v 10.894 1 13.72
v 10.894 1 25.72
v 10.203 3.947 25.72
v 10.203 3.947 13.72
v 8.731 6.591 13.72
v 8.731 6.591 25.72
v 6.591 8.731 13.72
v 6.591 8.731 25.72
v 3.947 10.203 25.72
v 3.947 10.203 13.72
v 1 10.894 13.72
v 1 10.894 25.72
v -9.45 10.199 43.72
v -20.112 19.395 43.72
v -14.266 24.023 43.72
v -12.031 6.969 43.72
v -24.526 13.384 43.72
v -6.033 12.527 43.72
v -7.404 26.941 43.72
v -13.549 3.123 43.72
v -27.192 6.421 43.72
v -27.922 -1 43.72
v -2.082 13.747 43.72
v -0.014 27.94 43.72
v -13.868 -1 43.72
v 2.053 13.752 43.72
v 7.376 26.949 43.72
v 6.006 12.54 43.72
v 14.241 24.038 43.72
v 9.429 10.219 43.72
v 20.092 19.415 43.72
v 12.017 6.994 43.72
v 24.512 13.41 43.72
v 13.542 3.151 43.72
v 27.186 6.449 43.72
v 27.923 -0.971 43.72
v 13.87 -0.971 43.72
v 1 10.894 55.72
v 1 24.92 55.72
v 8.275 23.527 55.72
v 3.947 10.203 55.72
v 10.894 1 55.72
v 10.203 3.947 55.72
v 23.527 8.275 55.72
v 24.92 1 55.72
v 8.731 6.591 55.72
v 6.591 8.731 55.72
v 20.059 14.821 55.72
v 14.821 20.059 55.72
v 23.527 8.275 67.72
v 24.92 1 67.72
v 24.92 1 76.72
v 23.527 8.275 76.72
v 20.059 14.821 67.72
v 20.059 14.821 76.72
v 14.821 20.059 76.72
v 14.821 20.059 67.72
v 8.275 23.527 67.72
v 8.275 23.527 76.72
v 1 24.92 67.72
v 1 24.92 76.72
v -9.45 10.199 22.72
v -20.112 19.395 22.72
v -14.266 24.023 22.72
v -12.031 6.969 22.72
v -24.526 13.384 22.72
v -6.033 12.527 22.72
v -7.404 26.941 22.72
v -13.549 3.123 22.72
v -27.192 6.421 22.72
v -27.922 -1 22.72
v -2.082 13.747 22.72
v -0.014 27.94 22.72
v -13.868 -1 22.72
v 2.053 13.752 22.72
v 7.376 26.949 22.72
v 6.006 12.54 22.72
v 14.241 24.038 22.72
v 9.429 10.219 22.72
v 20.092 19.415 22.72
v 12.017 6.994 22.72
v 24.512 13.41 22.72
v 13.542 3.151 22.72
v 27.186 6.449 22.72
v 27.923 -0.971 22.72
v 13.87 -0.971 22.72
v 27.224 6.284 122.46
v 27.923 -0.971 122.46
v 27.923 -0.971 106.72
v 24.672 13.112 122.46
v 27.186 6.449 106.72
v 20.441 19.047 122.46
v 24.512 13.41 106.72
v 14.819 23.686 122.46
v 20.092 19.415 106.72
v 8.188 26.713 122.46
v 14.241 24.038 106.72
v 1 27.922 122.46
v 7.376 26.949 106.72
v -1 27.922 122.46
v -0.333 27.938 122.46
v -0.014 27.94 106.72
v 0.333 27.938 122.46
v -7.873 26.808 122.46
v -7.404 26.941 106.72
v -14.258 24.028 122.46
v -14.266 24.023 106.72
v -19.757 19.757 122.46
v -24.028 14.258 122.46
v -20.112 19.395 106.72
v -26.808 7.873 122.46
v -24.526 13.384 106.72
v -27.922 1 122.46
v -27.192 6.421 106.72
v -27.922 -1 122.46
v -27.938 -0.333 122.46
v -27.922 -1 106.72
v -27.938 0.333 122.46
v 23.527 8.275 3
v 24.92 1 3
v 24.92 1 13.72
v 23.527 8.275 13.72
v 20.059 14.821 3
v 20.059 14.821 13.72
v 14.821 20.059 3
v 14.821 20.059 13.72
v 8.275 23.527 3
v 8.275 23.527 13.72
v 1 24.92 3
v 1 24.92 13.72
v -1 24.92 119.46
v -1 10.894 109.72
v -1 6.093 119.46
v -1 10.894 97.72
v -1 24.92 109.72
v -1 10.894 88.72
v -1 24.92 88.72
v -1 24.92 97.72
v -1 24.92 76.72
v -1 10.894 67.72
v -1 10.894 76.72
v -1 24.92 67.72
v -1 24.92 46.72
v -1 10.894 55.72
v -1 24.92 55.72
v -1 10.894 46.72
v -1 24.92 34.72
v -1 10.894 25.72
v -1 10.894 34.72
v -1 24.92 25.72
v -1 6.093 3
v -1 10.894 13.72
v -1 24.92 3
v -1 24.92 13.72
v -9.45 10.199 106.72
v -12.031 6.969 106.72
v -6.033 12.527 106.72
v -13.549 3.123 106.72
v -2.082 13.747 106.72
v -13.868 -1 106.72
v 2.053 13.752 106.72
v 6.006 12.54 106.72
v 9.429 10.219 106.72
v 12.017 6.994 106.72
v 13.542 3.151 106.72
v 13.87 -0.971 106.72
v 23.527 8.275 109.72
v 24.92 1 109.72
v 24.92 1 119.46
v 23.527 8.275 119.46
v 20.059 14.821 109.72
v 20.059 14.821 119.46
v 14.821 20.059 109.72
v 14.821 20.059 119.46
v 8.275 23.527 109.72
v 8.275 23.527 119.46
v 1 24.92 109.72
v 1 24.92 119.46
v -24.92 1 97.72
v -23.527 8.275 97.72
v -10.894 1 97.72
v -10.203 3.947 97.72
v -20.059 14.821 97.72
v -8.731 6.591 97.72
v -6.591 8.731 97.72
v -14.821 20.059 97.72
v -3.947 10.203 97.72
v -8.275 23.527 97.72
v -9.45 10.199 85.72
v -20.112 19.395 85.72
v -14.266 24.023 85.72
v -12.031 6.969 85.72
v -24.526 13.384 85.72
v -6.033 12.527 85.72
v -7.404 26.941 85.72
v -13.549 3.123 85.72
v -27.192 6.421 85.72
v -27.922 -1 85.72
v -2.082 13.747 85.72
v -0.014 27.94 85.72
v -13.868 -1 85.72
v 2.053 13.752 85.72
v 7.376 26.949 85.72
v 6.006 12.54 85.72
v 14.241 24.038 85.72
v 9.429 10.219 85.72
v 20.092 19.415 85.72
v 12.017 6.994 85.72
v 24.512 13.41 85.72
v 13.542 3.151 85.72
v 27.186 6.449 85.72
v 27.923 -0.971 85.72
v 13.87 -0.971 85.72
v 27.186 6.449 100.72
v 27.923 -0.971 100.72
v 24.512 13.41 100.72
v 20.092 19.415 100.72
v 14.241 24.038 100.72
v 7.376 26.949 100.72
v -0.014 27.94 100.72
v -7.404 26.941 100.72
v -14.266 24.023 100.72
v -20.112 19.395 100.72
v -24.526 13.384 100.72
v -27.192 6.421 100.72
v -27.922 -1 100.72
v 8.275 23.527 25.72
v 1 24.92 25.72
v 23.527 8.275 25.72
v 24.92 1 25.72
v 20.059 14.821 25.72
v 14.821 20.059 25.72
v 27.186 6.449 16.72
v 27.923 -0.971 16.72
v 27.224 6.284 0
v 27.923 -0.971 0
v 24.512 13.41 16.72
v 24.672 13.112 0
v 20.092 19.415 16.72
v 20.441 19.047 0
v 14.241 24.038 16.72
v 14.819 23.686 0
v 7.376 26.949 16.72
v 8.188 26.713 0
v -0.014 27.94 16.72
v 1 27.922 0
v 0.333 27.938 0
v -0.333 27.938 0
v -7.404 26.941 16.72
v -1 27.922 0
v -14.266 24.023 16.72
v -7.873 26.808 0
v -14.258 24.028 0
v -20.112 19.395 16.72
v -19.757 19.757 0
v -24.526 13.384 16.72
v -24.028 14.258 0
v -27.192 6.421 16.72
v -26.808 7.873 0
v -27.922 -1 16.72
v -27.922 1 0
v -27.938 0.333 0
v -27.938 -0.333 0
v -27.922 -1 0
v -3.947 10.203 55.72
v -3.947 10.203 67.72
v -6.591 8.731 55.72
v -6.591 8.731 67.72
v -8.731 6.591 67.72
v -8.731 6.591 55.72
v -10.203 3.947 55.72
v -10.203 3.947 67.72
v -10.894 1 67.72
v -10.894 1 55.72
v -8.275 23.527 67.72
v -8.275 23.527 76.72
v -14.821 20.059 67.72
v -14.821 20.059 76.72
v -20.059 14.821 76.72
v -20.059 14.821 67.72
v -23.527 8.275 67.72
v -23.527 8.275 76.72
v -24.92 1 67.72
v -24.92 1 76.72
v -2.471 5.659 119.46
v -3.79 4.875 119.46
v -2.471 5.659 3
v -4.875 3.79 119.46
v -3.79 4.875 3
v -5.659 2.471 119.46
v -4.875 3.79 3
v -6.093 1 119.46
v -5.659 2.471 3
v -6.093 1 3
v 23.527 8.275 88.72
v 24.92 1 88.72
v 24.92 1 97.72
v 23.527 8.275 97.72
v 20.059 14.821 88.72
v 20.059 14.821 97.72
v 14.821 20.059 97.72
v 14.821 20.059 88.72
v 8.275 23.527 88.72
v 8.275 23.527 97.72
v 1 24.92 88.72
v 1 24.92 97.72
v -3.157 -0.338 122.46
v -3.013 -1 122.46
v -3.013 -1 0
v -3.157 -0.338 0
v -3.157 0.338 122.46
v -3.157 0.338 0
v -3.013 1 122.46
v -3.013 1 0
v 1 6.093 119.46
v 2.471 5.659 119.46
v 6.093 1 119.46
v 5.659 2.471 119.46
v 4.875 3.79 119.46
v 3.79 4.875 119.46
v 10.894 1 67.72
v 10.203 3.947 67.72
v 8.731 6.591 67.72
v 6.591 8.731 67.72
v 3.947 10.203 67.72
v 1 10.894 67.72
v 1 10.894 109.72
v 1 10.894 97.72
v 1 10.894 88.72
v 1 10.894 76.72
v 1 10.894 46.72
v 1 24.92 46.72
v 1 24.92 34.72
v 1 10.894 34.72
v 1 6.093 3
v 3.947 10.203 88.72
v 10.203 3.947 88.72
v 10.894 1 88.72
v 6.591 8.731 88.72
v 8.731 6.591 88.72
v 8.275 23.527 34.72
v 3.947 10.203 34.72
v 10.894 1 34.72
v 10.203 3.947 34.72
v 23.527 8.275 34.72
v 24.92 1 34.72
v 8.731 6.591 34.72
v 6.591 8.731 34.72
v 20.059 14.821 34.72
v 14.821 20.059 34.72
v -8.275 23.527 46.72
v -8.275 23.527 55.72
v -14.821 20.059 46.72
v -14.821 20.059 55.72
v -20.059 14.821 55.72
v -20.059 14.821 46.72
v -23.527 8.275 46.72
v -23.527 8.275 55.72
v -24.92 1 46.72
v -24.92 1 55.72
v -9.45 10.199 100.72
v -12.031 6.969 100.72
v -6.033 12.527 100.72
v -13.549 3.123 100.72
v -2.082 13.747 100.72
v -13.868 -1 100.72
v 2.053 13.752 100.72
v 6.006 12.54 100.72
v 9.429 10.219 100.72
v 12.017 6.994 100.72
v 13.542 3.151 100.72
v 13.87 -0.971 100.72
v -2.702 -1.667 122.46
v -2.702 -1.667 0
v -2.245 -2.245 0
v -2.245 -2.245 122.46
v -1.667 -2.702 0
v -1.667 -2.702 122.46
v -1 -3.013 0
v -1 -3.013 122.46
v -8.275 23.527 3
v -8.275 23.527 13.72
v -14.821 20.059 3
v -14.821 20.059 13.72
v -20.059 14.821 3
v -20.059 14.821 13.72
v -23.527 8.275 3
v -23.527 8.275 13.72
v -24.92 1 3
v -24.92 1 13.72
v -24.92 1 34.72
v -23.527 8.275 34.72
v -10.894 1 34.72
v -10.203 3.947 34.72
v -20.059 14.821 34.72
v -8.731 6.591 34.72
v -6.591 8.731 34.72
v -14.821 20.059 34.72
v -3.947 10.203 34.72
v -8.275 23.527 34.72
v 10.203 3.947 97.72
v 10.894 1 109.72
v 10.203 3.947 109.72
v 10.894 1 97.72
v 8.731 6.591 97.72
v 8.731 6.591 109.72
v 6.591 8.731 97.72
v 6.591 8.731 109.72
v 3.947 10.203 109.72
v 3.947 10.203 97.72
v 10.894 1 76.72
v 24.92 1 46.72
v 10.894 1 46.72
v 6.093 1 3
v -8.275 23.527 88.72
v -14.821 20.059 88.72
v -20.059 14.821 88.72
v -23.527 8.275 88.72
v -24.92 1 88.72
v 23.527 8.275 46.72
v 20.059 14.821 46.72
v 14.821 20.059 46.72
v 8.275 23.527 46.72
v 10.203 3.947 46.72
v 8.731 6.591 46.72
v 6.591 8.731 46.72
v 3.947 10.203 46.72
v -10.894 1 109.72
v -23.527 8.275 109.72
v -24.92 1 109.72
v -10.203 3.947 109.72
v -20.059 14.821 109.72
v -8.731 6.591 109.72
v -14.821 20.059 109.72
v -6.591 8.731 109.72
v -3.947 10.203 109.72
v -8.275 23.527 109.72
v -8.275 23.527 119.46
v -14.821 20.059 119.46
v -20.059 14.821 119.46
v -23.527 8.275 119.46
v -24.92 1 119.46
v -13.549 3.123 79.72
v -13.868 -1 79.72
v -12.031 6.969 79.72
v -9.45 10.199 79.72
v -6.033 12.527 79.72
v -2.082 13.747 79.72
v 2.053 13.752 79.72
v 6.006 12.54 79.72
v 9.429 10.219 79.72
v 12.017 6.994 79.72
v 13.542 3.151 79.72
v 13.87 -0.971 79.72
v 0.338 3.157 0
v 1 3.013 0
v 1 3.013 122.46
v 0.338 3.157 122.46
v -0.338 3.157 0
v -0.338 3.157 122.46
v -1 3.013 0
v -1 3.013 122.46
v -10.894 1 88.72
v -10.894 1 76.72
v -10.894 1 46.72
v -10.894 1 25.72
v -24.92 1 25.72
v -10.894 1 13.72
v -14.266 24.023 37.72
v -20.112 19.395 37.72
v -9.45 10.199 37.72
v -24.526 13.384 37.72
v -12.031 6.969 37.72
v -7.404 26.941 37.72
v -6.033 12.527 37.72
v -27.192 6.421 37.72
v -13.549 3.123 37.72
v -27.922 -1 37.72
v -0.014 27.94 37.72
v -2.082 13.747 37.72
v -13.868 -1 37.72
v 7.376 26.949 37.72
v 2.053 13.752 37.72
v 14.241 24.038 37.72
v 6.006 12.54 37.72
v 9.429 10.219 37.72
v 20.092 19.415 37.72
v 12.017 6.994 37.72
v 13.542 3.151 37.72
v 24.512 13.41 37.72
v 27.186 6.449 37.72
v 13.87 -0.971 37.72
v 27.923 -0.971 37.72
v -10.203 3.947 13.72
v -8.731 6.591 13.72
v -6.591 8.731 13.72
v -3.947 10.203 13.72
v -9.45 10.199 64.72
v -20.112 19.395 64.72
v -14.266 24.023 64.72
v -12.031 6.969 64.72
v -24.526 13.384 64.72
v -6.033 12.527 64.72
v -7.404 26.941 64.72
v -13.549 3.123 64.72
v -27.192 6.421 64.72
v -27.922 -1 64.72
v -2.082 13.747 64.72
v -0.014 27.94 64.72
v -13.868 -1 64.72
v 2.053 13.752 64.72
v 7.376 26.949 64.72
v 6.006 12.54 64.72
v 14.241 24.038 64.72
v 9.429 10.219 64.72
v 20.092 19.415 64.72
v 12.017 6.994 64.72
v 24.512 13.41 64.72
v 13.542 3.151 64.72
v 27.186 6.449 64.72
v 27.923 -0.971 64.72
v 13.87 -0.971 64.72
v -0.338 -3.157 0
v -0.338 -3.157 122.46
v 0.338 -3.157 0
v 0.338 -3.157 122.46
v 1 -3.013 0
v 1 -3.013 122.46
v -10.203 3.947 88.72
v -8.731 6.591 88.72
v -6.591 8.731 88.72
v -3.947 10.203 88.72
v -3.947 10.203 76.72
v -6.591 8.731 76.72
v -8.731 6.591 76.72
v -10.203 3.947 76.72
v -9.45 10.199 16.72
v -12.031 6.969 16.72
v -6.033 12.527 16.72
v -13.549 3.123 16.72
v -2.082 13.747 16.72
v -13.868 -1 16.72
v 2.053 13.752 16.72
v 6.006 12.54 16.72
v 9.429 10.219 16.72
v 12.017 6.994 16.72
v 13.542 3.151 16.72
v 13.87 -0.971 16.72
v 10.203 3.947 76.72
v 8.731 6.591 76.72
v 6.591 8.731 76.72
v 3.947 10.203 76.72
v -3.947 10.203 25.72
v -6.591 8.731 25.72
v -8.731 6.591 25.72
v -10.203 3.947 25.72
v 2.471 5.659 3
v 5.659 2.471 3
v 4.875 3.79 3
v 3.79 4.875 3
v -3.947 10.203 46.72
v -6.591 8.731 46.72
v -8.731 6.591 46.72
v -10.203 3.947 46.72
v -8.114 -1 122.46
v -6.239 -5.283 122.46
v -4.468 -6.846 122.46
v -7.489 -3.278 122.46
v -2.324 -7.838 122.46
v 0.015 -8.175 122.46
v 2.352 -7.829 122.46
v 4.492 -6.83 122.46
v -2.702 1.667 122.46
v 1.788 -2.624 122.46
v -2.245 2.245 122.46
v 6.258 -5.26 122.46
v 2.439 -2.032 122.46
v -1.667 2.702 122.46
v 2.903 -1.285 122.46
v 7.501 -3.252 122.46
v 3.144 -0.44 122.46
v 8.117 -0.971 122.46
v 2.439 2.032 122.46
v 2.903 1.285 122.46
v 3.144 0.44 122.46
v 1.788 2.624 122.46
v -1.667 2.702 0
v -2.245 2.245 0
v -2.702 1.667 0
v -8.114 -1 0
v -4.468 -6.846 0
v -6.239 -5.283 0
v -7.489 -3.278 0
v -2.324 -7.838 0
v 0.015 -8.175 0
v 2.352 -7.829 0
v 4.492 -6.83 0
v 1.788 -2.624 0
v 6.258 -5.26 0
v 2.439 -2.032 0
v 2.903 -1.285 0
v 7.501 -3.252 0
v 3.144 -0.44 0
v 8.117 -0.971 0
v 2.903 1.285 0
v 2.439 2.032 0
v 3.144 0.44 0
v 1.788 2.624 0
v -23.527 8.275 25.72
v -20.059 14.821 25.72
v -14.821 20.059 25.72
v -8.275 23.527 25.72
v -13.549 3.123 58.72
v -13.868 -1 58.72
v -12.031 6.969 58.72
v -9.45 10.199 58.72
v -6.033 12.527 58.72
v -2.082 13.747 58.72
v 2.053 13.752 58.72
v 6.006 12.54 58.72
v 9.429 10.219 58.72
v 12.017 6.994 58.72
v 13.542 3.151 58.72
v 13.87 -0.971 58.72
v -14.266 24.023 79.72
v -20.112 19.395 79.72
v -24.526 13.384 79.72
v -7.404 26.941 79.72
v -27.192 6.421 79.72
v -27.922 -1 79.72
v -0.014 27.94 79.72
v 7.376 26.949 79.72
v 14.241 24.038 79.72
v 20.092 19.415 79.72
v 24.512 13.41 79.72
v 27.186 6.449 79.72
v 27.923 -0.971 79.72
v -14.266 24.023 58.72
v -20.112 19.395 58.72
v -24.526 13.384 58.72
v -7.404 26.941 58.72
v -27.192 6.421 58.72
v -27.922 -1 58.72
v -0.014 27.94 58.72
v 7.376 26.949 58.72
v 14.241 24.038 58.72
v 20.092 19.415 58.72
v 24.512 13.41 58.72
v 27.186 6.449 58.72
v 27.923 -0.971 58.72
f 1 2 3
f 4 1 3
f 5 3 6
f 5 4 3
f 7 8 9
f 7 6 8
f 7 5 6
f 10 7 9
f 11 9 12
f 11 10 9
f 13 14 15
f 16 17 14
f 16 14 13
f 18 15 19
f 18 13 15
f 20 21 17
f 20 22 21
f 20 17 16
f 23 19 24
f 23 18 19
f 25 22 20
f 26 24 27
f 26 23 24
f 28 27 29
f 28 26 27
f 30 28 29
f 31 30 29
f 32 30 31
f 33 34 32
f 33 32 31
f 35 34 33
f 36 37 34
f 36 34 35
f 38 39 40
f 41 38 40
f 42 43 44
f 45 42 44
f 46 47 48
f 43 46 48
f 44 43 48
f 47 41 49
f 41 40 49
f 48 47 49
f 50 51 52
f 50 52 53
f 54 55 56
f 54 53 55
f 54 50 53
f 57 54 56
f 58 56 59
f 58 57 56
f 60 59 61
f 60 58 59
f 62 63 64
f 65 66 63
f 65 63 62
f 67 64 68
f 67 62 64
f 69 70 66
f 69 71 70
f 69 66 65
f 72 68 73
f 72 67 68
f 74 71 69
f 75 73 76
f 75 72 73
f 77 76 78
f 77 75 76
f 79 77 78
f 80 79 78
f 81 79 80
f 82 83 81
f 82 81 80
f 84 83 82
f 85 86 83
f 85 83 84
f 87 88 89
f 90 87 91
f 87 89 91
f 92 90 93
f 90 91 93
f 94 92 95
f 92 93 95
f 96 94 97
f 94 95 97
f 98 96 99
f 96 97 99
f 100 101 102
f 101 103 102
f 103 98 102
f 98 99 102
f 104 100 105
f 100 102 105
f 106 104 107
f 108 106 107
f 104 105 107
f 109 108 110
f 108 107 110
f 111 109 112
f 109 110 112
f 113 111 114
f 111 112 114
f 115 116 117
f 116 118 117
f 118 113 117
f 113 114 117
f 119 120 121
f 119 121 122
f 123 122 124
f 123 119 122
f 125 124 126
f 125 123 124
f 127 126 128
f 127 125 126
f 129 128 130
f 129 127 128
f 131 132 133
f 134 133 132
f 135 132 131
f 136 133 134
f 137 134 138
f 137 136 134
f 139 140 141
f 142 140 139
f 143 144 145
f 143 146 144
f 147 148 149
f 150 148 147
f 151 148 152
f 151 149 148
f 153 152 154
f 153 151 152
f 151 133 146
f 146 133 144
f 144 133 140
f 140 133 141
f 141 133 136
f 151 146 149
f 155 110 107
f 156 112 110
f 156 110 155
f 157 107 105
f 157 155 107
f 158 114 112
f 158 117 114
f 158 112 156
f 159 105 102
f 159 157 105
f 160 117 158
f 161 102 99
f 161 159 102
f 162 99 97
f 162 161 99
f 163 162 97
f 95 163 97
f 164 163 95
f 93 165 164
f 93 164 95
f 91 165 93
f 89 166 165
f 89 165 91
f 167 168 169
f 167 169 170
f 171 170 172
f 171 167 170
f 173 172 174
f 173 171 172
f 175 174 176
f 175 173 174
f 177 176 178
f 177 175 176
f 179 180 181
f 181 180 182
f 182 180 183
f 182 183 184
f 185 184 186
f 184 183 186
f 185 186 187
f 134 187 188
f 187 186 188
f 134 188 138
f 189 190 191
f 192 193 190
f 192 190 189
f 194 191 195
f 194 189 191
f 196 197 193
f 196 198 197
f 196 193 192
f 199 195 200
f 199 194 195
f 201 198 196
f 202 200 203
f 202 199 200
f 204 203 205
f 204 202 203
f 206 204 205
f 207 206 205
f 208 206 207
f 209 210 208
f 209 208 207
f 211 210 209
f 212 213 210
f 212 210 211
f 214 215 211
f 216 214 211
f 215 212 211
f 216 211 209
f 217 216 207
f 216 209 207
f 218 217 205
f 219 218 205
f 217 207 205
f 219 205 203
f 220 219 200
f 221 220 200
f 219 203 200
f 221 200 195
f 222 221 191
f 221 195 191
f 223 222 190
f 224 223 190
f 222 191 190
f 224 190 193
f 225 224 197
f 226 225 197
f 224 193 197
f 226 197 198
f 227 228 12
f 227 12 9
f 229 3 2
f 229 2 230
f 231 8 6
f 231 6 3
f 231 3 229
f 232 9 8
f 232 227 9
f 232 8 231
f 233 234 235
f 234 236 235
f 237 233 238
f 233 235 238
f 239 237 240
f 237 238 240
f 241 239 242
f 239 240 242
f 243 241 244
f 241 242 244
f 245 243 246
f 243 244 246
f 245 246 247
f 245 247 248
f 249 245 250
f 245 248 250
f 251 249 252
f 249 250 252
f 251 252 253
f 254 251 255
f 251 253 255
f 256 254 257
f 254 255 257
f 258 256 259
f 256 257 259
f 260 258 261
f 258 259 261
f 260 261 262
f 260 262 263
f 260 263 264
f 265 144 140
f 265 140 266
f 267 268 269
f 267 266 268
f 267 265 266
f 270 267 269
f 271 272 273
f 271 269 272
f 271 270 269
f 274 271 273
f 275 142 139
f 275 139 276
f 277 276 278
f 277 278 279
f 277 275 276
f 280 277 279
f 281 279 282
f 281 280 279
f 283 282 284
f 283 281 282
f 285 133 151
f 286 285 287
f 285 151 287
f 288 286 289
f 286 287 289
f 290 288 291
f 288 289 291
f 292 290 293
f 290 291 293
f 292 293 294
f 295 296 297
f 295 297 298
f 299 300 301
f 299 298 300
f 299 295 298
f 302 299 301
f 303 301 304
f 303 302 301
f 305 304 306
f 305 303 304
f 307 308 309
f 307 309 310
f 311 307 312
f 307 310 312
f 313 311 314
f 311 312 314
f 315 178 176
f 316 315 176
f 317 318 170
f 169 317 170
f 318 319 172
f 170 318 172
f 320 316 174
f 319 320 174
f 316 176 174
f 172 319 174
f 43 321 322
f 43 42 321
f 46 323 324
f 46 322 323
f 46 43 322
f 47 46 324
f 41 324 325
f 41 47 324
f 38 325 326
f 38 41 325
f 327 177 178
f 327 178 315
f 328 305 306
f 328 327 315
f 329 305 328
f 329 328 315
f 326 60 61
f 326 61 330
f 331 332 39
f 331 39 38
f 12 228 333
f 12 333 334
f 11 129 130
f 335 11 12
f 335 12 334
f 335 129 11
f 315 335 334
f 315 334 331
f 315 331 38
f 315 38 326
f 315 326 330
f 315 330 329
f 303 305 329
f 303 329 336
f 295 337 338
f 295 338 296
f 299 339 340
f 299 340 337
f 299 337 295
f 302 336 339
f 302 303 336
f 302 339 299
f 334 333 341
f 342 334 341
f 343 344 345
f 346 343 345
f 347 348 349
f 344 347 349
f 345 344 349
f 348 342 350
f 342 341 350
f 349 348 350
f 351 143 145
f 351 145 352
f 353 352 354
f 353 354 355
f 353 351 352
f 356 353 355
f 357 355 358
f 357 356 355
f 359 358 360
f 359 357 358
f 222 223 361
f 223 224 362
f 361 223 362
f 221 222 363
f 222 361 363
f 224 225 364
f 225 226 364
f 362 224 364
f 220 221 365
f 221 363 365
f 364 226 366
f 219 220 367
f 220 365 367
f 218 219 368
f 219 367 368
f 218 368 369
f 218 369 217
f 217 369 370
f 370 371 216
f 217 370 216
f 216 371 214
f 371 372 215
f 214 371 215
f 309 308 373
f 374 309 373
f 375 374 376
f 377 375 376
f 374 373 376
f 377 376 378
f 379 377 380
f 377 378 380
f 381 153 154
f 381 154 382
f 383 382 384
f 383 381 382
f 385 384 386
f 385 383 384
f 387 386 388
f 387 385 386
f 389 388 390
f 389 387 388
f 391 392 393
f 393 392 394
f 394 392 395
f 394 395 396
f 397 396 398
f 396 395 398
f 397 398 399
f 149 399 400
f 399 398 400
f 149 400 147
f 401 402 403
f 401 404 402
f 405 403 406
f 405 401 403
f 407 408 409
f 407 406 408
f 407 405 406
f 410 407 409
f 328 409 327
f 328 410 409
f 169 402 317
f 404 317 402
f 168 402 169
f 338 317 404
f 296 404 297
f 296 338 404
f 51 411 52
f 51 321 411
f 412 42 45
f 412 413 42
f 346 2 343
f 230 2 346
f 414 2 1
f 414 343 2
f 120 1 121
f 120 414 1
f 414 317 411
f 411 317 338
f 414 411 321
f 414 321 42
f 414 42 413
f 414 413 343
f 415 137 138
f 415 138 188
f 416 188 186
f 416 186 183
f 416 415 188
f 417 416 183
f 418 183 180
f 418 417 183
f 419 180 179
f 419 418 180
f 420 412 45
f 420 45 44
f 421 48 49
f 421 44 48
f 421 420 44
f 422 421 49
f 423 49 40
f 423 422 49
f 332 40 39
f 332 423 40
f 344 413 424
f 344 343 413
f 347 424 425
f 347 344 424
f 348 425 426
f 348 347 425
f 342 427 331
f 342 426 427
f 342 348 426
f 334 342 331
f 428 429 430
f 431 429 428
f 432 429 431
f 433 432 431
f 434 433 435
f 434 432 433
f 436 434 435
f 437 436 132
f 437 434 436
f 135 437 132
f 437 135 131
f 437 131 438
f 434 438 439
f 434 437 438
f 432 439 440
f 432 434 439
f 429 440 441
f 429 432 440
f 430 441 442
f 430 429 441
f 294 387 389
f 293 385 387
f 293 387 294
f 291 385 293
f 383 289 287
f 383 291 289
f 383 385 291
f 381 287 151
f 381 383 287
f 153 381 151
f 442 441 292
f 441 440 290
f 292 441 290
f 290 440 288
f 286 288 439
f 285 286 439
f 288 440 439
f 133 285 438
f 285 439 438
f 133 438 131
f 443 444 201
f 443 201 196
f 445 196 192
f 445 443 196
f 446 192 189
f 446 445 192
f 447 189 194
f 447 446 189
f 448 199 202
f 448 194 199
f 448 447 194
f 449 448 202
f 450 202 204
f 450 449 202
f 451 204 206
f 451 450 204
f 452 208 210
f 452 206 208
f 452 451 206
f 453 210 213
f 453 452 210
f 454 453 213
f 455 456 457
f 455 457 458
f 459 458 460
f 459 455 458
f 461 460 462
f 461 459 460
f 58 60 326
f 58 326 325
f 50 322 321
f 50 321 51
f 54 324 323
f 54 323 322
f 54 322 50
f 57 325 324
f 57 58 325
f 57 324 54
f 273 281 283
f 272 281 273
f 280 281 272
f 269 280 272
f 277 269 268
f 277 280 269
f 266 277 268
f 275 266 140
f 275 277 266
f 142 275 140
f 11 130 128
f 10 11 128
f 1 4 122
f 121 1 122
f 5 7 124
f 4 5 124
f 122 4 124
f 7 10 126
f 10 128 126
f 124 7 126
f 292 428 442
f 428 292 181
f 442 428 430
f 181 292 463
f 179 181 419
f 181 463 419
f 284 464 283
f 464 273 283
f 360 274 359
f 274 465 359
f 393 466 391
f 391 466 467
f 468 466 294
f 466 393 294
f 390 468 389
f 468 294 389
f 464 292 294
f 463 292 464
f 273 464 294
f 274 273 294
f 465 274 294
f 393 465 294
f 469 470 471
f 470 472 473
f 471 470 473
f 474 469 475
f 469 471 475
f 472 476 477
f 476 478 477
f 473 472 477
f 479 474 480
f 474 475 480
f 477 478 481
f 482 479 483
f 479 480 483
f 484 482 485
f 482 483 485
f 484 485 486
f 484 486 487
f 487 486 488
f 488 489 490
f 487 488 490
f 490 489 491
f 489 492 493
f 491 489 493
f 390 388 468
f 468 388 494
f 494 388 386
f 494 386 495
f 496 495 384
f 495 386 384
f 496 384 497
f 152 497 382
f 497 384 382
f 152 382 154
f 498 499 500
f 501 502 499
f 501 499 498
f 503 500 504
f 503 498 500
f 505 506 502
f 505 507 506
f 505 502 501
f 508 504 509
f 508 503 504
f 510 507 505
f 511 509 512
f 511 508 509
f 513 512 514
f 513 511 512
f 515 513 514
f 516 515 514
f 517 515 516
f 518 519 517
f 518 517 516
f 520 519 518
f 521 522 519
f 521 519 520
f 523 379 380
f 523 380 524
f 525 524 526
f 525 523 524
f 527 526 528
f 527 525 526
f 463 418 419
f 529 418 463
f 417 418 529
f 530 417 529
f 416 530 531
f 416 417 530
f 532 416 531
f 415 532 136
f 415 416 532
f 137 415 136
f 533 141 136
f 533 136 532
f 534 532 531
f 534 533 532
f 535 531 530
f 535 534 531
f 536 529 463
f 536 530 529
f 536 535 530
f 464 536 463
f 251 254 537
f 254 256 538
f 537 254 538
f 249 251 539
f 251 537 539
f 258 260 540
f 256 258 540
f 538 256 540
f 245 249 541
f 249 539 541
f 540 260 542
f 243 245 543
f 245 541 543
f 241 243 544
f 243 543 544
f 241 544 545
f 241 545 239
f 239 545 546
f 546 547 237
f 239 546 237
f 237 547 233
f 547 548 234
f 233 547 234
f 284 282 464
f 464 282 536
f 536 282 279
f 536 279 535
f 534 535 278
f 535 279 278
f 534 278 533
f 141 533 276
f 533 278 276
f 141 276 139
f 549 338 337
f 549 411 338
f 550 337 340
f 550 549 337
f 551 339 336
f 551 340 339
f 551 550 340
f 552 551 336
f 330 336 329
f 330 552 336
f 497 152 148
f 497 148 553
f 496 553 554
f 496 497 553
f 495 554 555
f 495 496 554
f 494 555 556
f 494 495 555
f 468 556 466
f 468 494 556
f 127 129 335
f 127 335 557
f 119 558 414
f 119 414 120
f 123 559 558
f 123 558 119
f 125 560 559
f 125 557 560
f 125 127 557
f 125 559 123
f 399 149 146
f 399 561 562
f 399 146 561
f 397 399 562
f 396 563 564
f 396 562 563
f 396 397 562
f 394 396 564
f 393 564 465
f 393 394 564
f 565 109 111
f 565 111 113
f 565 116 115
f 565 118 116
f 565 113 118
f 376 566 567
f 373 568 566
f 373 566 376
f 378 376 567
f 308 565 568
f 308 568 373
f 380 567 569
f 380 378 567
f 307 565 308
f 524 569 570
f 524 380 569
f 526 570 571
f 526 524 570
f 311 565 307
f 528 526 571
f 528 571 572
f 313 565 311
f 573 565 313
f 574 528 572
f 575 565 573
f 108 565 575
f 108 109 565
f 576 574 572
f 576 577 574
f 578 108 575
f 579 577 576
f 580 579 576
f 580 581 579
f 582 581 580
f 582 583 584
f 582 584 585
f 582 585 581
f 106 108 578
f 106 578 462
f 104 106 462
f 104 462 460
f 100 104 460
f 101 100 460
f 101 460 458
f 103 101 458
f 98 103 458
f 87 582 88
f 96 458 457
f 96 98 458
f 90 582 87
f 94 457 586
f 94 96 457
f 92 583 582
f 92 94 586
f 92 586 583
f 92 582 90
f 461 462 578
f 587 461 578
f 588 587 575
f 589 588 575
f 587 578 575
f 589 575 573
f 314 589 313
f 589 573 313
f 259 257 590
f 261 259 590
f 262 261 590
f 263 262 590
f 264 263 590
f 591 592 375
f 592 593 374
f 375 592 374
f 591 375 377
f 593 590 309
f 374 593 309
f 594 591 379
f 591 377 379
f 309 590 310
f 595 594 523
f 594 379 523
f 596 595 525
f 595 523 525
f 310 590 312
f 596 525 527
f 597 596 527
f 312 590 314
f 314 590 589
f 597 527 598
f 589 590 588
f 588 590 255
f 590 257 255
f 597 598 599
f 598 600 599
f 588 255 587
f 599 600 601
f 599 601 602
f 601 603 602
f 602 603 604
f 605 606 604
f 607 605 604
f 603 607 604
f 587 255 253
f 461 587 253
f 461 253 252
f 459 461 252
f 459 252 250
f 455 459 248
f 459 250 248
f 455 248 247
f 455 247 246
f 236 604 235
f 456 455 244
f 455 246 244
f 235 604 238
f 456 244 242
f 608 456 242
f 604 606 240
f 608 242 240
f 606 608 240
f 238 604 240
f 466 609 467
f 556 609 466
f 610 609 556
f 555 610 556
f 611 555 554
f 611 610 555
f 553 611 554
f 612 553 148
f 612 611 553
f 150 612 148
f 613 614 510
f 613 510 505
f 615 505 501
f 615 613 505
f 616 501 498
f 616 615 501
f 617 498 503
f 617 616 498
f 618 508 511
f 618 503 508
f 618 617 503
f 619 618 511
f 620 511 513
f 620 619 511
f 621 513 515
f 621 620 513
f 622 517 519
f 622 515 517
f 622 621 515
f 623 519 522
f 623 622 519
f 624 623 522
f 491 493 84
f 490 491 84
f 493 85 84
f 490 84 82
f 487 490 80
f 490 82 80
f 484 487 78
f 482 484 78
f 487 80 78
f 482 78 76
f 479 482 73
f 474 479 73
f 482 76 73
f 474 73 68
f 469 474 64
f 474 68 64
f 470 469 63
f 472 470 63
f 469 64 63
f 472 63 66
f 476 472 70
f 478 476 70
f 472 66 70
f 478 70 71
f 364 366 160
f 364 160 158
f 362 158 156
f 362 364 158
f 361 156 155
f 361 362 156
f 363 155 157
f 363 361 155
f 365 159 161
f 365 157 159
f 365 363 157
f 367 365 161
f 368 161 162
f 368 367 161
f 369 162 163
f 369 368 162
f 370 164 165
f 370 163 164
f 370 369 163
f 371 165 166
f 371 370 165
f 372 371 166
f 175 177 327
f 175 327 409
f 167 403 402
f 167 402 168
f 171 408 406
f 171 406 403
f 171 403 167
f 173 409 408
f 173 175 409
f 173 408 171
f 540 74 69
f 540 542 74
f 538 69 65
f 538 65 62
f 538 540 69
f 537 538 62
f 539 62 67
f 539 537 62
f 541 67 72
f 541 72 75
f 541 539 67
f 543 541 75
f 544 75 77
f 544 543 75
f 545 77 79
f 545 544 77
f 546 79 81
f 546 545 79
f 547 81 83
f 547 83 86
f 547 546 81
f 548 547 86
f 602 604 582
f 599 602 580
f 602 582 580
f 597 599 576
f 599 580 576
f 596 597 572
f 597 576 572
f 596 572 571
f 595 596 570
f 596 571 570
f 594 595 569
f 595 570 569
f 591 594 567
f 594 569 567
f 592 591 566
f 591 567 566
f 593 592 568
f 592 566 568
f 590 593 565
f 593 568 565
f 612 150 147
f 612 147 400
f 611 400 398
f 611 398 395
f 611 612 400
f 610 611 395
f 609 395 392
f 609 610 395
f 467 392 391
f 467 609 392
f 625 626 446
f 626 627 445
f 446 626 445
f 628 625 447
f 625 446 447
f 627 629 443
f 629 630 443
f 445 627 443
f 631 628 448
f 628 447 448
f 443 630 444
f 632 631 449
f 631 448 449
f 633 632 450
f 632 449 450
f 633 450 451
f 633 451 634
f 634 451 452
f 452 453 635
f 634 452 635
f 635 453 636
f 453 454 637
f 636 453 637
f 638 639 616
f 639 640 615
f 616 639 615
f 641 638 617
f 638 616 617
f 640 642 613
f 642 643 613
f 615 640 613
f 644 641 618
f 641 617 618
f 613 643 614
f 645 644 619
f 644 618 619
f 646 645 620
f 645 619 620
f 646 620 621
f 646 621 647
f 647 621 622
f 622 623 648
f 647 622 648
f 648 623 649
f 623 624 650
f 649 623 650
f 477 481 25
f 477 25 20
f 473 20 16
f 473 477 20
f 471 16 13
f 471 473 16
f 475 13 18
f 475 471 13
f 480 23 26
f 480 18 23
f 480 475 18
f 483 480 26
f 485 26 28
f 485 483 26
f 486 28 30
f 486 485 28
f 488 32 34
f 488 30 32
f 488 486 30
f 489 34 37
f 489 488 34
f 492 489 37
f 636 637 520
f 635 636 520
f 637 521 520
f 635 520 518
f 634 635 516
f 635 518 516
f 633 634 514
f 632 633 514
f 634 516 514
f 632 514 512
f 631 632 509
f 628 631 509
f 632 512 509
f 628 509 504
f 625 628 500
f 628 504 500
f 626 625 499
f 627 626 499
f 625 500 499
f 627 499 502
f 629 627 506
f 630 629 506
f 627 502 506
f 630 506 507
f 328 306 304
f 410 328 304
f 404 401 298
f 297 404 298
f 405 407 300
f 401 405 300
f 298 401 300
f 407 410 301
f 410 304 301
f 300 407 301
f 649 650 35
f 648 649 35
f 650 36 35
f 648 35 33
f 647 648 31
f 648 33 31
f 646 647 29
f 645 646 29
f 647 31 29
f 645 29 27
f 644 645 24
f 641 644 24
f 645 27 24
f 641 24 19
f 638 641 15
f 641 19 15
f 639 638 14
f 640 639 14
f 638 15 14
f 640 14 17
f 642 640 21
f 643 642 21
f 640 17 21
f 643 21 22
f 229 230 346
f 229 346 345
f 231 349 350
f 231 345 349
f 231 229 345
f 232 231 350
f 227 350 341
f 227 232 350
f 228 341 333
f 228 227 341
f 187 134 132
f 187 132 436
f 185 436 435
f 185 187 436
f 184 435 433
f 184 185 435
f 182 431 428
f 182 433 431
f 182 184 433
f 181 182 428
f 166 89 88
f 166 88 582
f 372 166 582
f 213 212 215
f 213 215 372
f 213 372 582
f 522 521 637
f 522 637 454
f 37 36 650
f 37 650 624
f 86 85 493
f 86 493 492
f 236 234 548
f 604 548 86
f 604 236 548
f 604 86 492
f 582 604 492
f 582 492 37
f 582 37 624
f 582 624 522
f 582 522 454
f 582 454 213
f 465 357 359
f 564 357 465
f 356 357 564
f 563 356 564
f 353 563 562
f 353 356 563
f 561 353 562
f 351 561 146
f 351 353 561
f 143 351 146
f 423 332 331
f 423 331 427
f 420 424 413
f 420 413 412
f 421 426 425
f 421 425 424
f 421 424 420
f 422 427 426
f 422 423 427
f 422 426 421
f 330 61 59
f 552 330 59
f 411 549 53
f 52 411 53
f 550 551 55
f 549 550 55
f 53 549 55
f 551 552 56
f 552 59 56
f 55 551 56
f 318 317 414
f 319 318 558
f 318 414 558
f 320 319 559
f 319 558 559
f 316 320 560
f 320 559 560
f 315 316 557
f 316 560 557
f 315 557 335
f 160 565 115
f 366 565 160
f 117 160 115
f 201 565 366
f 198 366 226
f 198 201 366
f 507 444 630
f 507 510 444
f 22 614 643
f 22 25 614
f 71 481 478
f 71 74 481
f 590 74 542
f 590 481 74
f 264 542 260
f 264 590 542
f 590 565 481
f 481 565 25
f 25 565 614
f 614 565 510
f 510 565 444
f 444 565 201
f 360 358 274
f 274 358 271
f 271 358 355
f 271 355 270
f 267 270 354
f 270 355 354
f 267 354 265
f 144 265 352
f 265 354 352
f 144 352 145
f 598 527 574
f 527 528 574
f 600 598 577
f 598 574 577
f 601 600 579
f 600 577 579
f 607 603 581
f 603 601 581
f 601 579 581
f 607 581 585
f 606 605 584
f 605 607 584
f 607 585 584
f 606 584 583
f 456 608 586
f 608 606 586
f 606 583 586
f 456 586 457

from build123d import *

# Parameters (mm, degrees)
SKETCH3_R            = 27.94
BOSS_EXTRUDE2_DEPTH  = 122.46
SKETCH5_R            = 3.175
CUT_EXTRUDE1_DEPTH   = 129.676877488
SKETCH4_W            = 14
SKETCH4_H            = 6
SHELL1_START         = 3
SHELL1_OUTLINE_R     = 10.94
SHELL1_OUTLINE_R_2   = 6.175
SHELL1_DEPTH         = 116.46
SHELL1_2_OUTLINE_R   = 24.94
SHELL1_2_OUTLINE_R_2 = 10.94
SHELL1_2_DEPTH       = 10.72
SHELL1_START_2       = 109.72
SHELL1_3_OUTLINE_R   = 24.94
SHELL1_3_OUTLINE_R_2 = 10.94
SHELL1_3_DEPTH       = 9.74
SHELL1_START_3       = 25.72
SHELL1_4_OUTLINE_R   = 24.94
SHELL1_4_OUTLINE_R_2 = 10.94
SHELL1_4_DEPTH       = 9
SHELL1_START_4       = 46.72
SHELL1_5_OUTLINE_R   = 24.94
SHELL1_5_OUTLINE_R_2 = 10.94
SHELL1_5_DEPTH       = 9
SHELL1_START_5       = 67.72
SHELL1_6_OUTLINE_R   = 24.94
SHELL1_6_OUTLINE_R_2 = 10.94
SHELL1_6_DEPTH       = 9
SHELL1_START_6       = 88.72
SHELL1_7_OUTLINE_R   = 24.94
SHELL1_7_OUTLINE_R_2 = 10.94
SHELL1_7_DEPTH       = 9
BOSS_EXTRUDE3_REACH  = 130.677
SKETCH13_W           = 16.483162312
SKETCH13_H           = 6
CUT_EXTRUDE3_DEPTH   = 123
BOSS_EXTRUDE5_START  = -122.46
BOSS_EXTRUDE5_DEPTH  = 122.46


# Read off the part's stored shape, not the designer's step: Shell1
with BuildPart() as part:
    # Sketch3 → Boss-Extrude2 (new body)
    with BuildSketch(Plane.XY):
        Circle(SKETCH3_R)
    extrude(amount=BOSS_EXTRUDE2_DEPTH)

    # Sketch5 → Cut-Extrude1 (cut, through all)
    with BuildSketch(Plane.XY.offset(122.46)):
        Circle(SKETCH5_R)
    extrude(amount=-CUT_EXTRUDE1_DEPTH, mode=Mode.SUBTRACT)

    # Sketch4 → Cut-Revolve1 (revolve, cut)
    with BuildSketch(Plane(origin=(0, 0, 0), x_dir=(1, 0, 0), z_dir=(0, 1, 0)), mode=Mode.PRIVATE) as cut_revolve1_sk:
        with Locations((-20.94, -103.72)):
            Rectangle(SKETCH4_W, SKETCH4_H)
        with Locations((-20.94, -82.72)):
            Rectangle(SKETCH4_W, SKETCH4_H)
        with Locations((-20.94, -61.72)):
            Rectangle(SKETCH4_W, SKETCH4_H)
        with Locations((-20.94, -40.72)):
            Rectangle(SKETCH4_W, SKETCH4_H)
        with Locations((-20.94, -19.72)):
            Rectangle(SKETCH4_W, SKETCH4_H)
    revolve(cut_revolve1_sk.sketch.rotate(Axis((0, 0, 122.46), (0, 0, -1)), 180), axis=Axis((0, 0, 122.46), (0, 0, -1)), mode=Mode.SUBTRACT)

    # Shell1 outline → Shell1 (cut)
    with BuildSketch(Plane.XY.offset(SHELL1_START)):
        Circle(SHELL1_OUTLINE_R)
        Circle(SHELL1_OUTLINE_R_2, mode=Mode.SUBTRACT)
    extrude(amount=SHELL1_DEPTH, mode=Mode.SUBTRACT)

    # Shell1 2 outline → Shell1 2 (cut)
    with BuildSketch(Plane.XY.offset(SHELL1_START)):
        Circle(SHELL1_2_OUTLINE_R)
        Circle(SHELL1_2_OUTLINE_R_2, mode=Mode.SUBTRACT)
    extrude(amount=SHELL1_2_DEPTH, mode=Mode.SUBTRACT)

    # Shell1 3 outline → Shell1 3 (cut)
    with BuildSketch(Plane.XY.offset(SHELL1_START_2)):
        Circle(SHELL1_3_OUTLINE_R)
        Circle(SHELL1_3_OUTLINE_R_2, mode=Mode.SUBTRACT)
    extrude(amount=SHELL1_3_DEPTH, mode=Mode.SUBTRACT)

    # Shell1 4 outline → Shell1 4 (cut)
    with BuildSketch(Plane.XY.offset(SHELL1_START_3)):
        Circle(SHELL1_4_OUTLINE_R)
        Circle(SHELL1_4_OUTLINE_R_2, mode=Mode.SUBTRACT)
    extrude(amount=SHELL1_4_DEPTH, mode=Mode.SUBTRACT)

    # Shell1 5 outline → Shell1 5 (cut)
    with BuildSketch(Plane.XY.offset(SHELL1_START_4)):
        Circle(SHELL1_5_OUTLINE_R)
        Circle(SHELL1_5_OUTLINE_R_2, mode=Mode.SUBTRACT)
    extrude(amount=SHELL1_5_DEPTH, mode=Mode.SUBTRACT)

    # Shell1 6 outline → Shell1 6 (cut)
    with BuildSketch(Plane.XY.offset(SHELL1_START_5)):
        Circle(SHELL1_6_OUTLINE_R)
        Circle(SHELL1_6_OUTLINE_R_2, mode=Mode.SUBTRACT)
    extrude(amount=SHELL1_6_DEPTH, mode=Mode.SUBTRACT)

    # Shell1 7 outline → Shell1 7 (cut)
    with BuildSketch(Plane.XY.offset(SHELL1_START_6)):
        Circle(SHELL1_7_OUTLINE_R)
        Circle(SHELL1_7_OUTLINE_R_2, mode=Mode.SUBTRACT)
    extrude(amount=SHELL1_7_DEPTH, mode=Mode.SUBTRACT)

    # Boss-Extrude3: up to this face of the body (flat: up to its plane)
    boss_extrude3_end = Plane(part.part.faces().sort_by_distance((-27.149737461, 0, 122.46))[0])
    # Sketch10 → Boss-Extrude3 (add, up to the picked face)
    with BuildSketch(Plane(origin=(0, 0, 0), x_dir=(-1, 0, 0), z_dir=(0, 0, -1)), mode=Mode.PRIVATE) as boss_extrude3_sk1:
        with BuildLine():
            Line((-1, 27.922098775), (-1, 3.01340754))
            ThreePointArc((-1, 3.01340754), (0, 3.175), (1, 3.01340754))
            Line((1, 3.01340754), (1, 27.922098775))
            ThreePointArc((1, 27.922098775), (0, 27.94), (-1, 27.922098775))
        make_face()
    boss_extrude3_tool1 = split(extrude(boss_extrude3_sk1.sketch, amount=-BOSS_EXTRUDE3_REACH, mode=Mode.PRIVATE), bisect_by=boss_extrude3_end, keep=Keep.BOTH, mode=Mode.PRIVATE)
    # Sketch10 → Boss-Extrude3 (add, up to the picked face)
    with BuildSketch(Plane(origin=(0, 0, 0), x_dir=(-1, 0, 0), z_dir=(0, 0, -1)), mode=Mode.PRIVATE) as boss_extrude3_sk2:
        with BuildLine():
            Line((3.01340754, 1), (27.922098775, 1))
            ThreePointArc((27.922098775, 1), (27.94, 0), (27.922098775, -1))
            Line((27.922098775, -1), (3.01340754, -1))
            ThreePointArc((3.01340754, -1), (3.175, 0), (3.01340754, 1))
        make_face()
    boss_extrude3_tool2 = split(extrude(boss_extrude3_sk2.sketch, amount=-BOSS_EXTRUDE3_REACH, mode=Mode.PRIVATE), bisect_by=boss_extrude3_end, keep=Keep.BOTH, mode=Mode.PRIVATE)
    # Sketch10 → Boss-Extrude3 (add, up to the picked face)
    with BuildSketch(Plane(origin=(0, 0, 0), x_dir=(-1, 0, 0), z_dir=(0, 0, -1)), mode=Mode.PRIVATE) as boss_extrude3_sk3:
        with BuildLine():
            Line((-1, -3.01340754), (-1, -27.922098775))
            ThreePointArc((-1, -27.922098775), (0, -27.94), (1, -27.922098775))
            Line((1, -27.922098775), (1, -3.01340754))
            ThreePointArc((1, -3.01340754), (0, -3.175), (-1, -3.01340754))
        make_face()
    boss_extrude3_tool3 = split(extrude(boss_extrude3_sk3.sketch, amount=-BOSS_EXTRUDE3_REACH, mode=Mode.PRIVATE), bisect_by=boss_extrude3_end, keep=Keep.BOTH, mode=Mode.PRIVATE)
    # Sketch10 → Boss-Extrude3 (add, up to the picked face)
    with BuildSketch(Plane(origin=(0, 0, 0), x_dir=(-1, 0, 0), z_dir=(0, 0, -1)), mode=Mode.PRIVATE) as boss_extrude3_sk4:
        with BuildLine():
            Line((-27.922098775, -1), (-3.01340754, -1))
            ThreePointArc((-3.01340754, -1), (-3.175, 0), (-3.01340754, 1))
            Line((-3.01340754, 1), (-27.922098775, 1))
            ThreePointArc((-27.922098775, 1), (-27.94, 0), (-27.922098775, -1))
        make_face()
    boss_extrude3_tool4 = split(extrude(boss_extrude3_sk4.sketch, amount=-BOSS_EXTRUDE3_REACH, mode=Mode.PRIVATE), bisect_by=boss_extrude3_end, keep=Keep.BOTH, mode=Mode.PRIVATE)
    add(boss_extrude3_tool1.solids().sort_by(Axis((0, 15.527819, 0), (0, 0, 1)))[0])
    add(boss_extrude3_tool2.solids().sort_by(Axis((-15.527819, 0, 0), (0, 0, 1)))[0])
    add(boss_extrude3_tool3.solids().sort_by(Axis((0, -15.527819, 0), (0, 0, 1)))[0])
    add(boss_extrude3_tool4.solids().sort_by(Axis((15.527819, 0, 0), (0, 0, 1)))[0])

    # Sketch13 → Cut-Revolve2 (revolve, cut)
    with BuildSketch(Plane(origin=(0, 0, 0), x_dir=(1, 0, 0), z_dir=(0, 1, 0)), mode=Mode.PRIVATE) as cut_revolve2_sk:
        with Locations((-22.145666886, -40.72)):
            Rectangle(SKETCH13_W, SKETCH13_H)
        with Locations((-22.145666886, -19.72)):
            Rectangle(SKETCH13_W, SKETCH13_H)
        with Locations((-22.145666886, -61.72)):
            Rectangle(SKETCH13_W, SKETCH13_H)
        with Locations((-22.145666886, -82.72)):
            Rectangle(SKETCH13_W, SKETCH13_H)
        with Locations((-22.145666886, -103.72)):
            Rectangle(SKETCH13_W, SKETCH13_H)
    revolve(cut_revolve2_sk.sketch.rotate(Axis((0, 0, 121.588746248), (0, 0, -1)), 180), axis=Axis((0, 0, 121.588746248), (0, 0, -1)), mode=Mode.SUBTRACT)

    # Sketch16 → Cut-Extrude3 (cut)
    with BuildSketch(Plane(origin=(0, 0, 0), x_dir=(-1, 0, 0), z_dir=(0, 0, -1))):
        with BuildLine():
            Line((-27.923120749, -0.971044624), (-6.098171639, -0.971044624))
            ThreePointArc((-6.098171639, -0.971044624), (-0.014665674, -6.174982584), (6.093490379, -1))
            Line((6.093490379, -1), (27.922098775, -1))
            ThreePointArc((27.922098775, -1), (-0.014486703, -27.939996244), (-27.923120749, -0.971044624))
        make_face()
    extrude(amount=-CUT_EXTRUDE3_DEPTH, mode=Mode.SUBTRACT)

    # Sketch18 → Boss-Extrude5 (add)
    with BuildSketch(Plane(origin=(0, 0, 0), x_dir=(-1, 0, 0), z_dir=(0, 0, -1)).offset(BOSS_EXTRUDE5_START)):
        with BuildLine():
            Line((-3.175, 0), (-8.175, 0))
            ThreePointArc((-8.175, 0), (0, -8.175), (8.175, 0))
            Line((8.175, 0), (3.175, 0))
            ThreePointArc((3.175, 0), (0, -3.175), (-3.175, 0))
        make_face()
    extrude(amount=BOSS_EXTRUDE5_DEPTH)


solid = part.part
